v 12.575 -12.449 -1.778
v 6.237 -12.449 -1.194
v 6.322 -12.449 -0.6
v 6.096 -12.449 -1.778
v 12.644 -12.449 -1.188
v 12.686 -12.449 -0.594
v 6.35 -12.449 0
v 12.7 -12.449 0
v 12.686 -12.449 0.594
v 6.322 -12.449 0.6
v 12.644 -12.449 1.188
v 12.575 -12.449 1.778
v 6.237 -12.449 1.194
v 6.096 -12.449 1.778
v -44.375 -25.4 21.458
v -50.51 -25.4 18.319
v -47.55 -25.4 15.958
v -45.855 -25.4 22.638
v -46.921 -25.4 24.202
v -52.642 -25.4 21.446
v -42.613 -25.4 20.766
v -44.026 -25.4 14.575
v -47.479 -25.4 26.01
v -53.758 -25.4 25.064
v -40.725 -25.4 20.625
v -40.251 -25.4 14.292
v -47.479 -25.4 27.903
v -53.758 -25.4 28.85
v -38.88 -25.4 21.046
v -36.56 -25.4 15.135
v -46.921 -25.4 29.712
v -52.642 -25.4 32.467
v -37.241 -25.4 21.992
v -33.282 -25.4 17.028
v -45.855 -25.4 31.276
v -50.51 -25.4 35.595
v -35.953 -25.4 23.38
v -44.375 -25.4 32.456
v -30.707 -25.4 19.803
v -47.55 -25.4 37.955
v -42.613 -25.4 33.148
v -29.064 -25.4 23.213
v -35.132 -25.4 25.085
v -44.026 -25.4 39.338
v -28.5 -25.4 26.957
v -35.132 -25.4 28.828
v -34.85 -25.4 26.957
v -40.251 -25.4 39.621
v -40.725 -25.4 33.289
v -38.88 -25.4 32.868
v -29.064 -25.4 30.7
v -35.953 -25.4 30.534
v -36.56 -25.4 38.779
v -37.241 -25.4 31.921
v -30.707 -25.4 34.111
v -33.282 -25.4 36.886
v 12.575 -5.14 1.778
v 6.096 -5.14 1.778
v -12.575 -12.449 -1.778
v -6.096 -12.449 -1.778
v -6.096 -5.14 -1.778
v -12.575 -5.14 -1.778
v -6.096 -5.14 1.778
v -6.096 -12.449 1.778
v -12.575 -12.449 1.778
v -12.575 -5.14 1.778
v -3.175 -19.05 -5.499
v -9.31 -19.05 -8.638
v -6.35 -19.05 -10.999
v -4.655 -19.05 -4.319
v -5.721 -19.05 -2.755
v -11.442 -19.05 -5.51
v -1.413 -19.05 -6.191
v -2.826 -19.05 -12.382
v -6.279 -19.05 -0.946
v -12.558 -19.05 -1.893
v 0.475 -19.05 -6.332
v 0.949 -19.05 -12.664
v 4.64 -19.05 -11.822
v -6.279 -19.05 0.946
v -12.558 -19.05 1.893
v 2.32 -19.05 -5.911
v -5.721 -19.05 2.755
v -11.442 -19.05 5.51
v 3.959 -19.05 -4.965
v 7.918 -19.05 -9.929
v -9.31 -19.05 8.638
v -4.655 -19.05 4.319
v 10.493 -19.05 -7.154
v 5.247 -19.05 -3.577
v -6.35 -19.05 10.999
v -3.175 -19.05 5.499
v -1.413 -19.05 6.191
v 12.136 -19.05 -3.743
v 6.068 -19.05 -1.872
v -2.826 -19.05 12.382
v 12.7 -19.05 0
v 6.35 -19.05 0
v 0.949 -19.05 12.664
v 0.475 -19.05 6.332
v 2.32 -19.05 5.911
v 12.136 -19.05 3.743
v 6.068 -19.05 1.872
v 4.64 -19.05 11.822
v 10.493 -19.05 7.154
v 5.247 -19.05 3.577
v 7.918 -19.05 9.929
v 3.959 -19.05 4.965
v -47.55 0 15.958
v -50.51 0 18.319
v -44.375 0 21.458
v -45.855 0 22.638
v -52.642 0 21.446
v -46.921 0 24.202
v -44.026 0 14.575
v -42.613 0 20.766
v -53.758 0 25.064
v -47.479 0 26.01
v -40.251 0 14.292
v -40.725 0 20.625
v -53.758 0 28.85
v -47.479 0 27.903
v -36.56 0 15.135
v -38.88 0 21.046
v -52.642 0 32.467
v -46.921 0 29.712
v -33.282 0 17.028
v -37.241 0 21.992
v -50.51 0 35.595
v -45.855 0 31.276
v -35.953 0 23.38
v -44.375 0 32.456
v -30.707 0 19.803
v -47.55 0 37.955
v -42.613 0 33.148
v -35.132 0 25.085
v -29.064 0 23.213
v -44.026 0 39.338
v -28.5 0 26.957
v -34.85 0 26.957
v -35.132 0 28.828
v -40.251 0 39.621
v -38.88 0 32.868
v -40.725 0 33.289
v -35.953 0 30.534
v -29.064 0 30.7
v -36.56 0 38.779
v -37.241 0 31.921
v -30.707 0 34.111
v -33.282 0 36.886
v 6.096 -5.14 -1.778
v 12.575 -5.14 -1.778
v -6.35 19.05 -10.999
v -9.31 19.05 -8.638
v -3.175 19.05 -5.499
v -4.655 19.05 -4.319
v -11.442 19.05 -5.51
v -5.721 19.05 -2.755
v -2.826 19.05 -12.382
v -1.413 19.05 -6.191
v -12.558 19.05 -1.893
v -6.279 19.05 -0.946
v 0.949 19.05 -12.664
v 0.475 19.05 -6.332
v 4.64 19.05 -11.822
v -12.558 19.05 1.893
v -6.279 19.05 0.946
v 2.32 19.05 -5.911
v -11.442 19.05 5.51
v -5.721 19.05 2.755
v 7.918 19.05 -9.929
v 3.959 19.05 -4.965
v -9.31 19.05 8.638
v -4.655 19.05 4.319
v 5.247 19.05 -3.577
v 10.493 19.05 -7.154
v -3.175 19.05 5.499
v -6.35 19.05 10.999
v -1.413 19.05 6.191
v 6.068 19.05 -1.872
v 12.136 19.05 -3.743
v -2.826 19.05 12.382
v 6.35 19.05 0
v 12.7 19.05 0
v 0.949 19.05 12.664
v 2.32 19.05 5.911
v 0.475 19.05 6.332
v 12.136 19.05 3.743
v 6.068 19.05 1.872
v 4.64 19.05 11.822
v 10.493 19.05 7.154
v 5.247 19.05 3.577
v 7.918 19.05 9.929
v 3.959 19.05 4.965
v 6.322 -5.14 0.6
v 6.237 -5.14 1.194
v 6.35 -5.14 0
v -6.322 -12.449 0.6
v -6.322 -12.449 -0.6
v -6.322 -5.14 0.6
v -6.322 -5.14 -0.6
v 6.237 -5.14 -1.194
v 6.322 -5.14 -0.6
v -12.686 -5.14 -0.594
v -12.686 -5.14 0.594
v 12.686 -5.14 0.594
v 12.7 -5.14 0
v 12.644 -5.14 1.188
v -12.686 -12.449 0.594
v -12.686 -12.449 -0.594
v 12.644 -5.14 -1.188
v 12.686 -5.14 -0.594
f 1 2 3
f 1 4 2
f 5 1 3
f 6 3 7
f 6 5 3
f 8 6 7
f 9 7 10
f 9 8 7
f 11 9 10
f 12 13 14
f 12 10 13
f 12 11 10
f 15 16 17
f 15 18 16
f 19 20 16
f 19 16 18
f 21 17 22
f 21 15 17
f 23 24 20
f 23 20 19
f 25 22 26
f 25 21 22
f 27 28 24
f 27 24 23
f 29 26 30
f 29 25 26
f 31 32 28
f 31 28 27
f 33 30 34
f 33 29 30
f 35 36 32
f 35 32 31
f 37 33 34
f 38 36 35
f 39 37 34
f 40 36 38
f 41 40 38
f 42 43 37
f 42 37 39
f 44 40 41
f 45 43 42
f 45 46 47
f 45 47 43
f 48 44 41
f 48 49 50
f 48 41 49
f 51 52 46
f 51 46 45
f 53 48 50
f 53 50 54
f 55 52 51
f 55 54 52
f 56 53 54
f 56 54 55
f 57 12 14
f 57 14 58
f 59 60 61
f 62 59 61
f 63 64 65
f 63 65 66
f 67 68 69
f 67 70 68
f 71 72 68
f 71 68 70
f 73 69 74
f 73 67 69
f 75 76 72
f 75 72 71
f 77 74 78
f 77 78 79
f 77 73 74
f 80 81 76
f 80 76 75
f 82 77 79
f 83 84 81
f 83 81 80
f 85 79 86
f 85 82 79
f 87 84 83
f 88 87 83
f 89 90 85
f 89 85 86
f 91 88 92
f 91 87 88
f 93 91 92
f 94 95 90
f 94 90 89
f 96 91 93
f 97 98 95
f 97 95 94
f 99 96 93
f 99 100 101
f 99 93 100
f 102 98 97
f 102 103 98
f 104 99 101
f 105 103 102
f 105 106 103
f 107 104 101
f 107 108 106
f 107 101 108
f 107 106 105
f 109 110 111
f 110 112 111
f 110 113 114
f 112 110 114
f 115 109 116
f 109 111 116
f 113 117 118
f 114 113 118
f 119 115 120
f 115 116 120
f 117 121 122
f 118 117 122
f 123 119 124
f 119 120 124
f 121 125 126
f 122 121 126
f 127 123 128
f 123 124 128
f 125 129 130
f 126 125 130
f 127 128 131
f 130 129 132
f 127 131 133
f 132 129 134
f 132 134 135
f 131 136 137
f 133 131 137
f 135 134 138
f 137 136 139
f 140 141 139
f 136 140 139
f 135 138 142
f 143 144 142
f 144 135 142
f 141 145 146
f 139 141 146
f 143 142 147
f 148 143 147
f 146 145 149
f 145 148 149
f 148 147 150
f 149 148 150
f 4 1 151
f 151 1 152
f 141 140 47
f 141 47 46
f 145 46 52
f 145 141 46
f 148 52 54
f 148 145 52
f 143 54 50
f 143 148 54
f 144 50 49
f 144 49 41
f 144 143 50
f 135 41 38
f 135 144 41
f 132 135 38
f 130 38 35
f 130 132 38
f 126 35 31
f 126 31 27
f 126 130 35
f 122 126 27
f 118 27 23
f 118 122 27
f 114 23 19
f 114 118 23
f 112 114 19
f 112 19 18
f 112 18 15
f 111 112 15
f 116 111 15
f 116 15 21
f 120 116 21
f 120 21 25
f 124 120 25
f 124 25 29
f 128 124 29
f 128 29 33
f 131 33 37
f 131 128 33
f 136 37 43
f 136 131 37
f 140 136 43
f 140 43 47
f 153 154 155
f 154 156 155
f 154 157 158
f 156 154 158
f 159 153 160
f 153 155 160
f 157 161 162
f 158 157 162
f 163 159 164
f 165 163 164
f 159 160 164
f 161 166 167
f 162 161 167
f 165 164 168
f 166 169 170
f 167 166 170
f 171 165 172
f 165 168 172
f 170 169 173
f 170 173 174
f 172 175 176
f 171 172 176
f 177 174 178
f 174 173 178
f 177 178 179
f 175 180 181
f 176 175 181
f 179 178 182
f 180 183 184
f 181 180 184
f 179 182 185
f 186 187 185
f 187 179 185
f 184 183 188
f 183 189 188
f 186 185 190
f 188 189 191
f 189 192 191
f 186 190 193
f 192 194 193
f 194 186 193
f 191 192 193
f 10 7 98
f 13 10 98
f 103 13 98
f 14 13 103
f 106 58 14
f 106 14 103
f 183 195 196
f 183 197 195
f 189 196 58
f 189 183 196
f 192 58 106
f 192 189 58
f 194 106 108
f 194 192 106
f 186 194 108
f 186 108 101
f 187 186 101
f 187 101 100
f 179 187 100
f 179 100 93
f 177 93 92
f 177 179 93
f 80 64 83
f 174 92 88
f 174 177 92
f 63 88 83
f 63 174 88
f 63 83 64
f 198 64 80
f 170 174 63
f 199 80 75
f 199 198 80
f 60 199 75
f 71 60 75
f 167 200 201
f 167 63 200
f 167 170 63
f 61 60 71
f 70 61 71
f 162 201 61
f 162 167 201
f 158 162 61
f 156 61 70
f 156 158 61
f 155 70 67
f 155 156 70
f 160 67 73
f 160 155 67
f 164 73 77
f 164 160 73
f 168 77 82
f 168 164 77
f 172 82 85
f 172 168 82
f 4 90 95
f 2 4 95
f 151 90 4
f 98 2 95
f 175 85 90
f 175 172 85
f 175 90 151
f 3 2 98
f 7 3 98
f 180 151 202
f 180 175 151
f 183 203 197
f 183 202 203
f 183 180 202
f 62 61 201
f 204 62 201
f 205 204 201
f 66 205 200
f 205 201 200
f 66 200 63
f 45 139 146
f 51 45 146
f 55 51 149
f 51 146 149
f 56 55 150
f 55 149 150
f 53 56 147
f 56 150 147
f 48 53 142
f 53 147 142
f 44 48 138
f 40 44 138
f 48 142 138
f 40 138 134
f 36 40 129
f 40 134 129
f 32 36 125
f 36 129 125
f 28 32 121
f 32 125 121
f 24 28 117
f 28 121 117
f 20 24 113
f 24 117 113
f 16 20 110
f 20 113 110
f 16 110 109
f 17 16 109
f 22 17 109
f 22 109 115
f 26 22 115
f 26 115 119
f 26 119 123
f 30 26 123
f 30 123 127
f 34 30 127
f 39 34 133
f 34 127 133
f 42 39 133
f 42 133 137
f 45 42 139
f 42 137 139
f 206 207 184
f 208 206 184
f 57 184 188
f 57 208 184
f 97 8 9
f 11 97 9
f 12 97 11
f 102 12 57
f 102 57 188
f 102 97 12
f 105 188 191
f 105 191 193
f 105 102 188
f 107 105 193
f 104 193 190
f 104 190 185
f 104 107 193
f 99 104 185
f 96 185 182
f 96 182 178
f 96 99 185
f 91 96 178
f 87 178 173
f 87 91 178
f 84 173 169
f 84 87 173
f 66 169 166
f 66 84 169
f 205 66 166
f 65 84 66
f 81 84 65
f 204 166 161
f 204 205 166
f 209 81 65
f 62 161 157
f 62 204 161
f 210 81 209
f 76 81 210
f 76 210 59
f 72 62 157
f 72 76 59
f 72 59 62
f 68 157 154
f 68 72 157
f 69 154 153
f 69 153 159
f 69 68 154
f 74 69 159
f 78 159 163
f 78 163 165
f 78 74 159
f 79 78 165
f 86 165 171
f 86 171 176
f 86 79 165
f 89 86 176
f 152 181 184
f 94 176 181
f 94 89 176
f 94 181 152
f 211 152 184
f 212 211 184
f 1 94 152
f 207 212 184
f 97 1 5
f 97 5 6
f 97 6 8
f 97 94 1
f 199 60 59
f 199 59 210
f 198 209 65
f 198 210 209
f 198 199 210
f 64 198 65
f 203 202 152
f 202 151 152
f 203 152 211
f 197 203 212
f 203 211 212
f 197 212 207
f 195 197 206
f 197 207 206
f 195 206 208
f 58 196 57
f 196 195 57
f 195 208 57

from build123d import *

# Parameters (mm, degrees)
F0_R     = 12.7
F0_R_2   = 6.35
F1_DEPTH = 19.05
F2_R     = 12.7
F2_R_2   = 6.35
F3_DEPTH = 25.4
F4_W     = 7.309555
F4_H     = 3.556
F5_DEPTH = 12.7


with BuildPart() as f1:
    # F0 (on Front) → F1 (new body, symmetric)
    with BuildSketch(Plane.XZ):
        Circle(F0_R)
        Circle(F0_R_2, mode=Mode.SUBTRACT)
    extrude(amount=F1_DEPTH, both=True)

    # F4 (on Right) → F5 (cut, symmetric)
    with BuildSketch(Plane.YZ):
        with Locations((-8.794408, 0)):
            Rectangle(F4_W, F4_H)
    extrude(amount=F5_DEPTH, both=True, mode=Mode.SUBTRACT)


with BuildPart() as f3:
    # F2 (on Front) → F3 (new body)
    with BuildSketch(Plane.XZ):
        with Locations((-41.199893, 26.956774)):
            Circle(F2_R)
        with Locations((-41.199893, 26.956774)):
            Circle(F2_R_2, mode=Mode.SUBTRACT)
    extrude(amount=F3_DEPTH)


solid = Compound([f1.part, f3.part])
